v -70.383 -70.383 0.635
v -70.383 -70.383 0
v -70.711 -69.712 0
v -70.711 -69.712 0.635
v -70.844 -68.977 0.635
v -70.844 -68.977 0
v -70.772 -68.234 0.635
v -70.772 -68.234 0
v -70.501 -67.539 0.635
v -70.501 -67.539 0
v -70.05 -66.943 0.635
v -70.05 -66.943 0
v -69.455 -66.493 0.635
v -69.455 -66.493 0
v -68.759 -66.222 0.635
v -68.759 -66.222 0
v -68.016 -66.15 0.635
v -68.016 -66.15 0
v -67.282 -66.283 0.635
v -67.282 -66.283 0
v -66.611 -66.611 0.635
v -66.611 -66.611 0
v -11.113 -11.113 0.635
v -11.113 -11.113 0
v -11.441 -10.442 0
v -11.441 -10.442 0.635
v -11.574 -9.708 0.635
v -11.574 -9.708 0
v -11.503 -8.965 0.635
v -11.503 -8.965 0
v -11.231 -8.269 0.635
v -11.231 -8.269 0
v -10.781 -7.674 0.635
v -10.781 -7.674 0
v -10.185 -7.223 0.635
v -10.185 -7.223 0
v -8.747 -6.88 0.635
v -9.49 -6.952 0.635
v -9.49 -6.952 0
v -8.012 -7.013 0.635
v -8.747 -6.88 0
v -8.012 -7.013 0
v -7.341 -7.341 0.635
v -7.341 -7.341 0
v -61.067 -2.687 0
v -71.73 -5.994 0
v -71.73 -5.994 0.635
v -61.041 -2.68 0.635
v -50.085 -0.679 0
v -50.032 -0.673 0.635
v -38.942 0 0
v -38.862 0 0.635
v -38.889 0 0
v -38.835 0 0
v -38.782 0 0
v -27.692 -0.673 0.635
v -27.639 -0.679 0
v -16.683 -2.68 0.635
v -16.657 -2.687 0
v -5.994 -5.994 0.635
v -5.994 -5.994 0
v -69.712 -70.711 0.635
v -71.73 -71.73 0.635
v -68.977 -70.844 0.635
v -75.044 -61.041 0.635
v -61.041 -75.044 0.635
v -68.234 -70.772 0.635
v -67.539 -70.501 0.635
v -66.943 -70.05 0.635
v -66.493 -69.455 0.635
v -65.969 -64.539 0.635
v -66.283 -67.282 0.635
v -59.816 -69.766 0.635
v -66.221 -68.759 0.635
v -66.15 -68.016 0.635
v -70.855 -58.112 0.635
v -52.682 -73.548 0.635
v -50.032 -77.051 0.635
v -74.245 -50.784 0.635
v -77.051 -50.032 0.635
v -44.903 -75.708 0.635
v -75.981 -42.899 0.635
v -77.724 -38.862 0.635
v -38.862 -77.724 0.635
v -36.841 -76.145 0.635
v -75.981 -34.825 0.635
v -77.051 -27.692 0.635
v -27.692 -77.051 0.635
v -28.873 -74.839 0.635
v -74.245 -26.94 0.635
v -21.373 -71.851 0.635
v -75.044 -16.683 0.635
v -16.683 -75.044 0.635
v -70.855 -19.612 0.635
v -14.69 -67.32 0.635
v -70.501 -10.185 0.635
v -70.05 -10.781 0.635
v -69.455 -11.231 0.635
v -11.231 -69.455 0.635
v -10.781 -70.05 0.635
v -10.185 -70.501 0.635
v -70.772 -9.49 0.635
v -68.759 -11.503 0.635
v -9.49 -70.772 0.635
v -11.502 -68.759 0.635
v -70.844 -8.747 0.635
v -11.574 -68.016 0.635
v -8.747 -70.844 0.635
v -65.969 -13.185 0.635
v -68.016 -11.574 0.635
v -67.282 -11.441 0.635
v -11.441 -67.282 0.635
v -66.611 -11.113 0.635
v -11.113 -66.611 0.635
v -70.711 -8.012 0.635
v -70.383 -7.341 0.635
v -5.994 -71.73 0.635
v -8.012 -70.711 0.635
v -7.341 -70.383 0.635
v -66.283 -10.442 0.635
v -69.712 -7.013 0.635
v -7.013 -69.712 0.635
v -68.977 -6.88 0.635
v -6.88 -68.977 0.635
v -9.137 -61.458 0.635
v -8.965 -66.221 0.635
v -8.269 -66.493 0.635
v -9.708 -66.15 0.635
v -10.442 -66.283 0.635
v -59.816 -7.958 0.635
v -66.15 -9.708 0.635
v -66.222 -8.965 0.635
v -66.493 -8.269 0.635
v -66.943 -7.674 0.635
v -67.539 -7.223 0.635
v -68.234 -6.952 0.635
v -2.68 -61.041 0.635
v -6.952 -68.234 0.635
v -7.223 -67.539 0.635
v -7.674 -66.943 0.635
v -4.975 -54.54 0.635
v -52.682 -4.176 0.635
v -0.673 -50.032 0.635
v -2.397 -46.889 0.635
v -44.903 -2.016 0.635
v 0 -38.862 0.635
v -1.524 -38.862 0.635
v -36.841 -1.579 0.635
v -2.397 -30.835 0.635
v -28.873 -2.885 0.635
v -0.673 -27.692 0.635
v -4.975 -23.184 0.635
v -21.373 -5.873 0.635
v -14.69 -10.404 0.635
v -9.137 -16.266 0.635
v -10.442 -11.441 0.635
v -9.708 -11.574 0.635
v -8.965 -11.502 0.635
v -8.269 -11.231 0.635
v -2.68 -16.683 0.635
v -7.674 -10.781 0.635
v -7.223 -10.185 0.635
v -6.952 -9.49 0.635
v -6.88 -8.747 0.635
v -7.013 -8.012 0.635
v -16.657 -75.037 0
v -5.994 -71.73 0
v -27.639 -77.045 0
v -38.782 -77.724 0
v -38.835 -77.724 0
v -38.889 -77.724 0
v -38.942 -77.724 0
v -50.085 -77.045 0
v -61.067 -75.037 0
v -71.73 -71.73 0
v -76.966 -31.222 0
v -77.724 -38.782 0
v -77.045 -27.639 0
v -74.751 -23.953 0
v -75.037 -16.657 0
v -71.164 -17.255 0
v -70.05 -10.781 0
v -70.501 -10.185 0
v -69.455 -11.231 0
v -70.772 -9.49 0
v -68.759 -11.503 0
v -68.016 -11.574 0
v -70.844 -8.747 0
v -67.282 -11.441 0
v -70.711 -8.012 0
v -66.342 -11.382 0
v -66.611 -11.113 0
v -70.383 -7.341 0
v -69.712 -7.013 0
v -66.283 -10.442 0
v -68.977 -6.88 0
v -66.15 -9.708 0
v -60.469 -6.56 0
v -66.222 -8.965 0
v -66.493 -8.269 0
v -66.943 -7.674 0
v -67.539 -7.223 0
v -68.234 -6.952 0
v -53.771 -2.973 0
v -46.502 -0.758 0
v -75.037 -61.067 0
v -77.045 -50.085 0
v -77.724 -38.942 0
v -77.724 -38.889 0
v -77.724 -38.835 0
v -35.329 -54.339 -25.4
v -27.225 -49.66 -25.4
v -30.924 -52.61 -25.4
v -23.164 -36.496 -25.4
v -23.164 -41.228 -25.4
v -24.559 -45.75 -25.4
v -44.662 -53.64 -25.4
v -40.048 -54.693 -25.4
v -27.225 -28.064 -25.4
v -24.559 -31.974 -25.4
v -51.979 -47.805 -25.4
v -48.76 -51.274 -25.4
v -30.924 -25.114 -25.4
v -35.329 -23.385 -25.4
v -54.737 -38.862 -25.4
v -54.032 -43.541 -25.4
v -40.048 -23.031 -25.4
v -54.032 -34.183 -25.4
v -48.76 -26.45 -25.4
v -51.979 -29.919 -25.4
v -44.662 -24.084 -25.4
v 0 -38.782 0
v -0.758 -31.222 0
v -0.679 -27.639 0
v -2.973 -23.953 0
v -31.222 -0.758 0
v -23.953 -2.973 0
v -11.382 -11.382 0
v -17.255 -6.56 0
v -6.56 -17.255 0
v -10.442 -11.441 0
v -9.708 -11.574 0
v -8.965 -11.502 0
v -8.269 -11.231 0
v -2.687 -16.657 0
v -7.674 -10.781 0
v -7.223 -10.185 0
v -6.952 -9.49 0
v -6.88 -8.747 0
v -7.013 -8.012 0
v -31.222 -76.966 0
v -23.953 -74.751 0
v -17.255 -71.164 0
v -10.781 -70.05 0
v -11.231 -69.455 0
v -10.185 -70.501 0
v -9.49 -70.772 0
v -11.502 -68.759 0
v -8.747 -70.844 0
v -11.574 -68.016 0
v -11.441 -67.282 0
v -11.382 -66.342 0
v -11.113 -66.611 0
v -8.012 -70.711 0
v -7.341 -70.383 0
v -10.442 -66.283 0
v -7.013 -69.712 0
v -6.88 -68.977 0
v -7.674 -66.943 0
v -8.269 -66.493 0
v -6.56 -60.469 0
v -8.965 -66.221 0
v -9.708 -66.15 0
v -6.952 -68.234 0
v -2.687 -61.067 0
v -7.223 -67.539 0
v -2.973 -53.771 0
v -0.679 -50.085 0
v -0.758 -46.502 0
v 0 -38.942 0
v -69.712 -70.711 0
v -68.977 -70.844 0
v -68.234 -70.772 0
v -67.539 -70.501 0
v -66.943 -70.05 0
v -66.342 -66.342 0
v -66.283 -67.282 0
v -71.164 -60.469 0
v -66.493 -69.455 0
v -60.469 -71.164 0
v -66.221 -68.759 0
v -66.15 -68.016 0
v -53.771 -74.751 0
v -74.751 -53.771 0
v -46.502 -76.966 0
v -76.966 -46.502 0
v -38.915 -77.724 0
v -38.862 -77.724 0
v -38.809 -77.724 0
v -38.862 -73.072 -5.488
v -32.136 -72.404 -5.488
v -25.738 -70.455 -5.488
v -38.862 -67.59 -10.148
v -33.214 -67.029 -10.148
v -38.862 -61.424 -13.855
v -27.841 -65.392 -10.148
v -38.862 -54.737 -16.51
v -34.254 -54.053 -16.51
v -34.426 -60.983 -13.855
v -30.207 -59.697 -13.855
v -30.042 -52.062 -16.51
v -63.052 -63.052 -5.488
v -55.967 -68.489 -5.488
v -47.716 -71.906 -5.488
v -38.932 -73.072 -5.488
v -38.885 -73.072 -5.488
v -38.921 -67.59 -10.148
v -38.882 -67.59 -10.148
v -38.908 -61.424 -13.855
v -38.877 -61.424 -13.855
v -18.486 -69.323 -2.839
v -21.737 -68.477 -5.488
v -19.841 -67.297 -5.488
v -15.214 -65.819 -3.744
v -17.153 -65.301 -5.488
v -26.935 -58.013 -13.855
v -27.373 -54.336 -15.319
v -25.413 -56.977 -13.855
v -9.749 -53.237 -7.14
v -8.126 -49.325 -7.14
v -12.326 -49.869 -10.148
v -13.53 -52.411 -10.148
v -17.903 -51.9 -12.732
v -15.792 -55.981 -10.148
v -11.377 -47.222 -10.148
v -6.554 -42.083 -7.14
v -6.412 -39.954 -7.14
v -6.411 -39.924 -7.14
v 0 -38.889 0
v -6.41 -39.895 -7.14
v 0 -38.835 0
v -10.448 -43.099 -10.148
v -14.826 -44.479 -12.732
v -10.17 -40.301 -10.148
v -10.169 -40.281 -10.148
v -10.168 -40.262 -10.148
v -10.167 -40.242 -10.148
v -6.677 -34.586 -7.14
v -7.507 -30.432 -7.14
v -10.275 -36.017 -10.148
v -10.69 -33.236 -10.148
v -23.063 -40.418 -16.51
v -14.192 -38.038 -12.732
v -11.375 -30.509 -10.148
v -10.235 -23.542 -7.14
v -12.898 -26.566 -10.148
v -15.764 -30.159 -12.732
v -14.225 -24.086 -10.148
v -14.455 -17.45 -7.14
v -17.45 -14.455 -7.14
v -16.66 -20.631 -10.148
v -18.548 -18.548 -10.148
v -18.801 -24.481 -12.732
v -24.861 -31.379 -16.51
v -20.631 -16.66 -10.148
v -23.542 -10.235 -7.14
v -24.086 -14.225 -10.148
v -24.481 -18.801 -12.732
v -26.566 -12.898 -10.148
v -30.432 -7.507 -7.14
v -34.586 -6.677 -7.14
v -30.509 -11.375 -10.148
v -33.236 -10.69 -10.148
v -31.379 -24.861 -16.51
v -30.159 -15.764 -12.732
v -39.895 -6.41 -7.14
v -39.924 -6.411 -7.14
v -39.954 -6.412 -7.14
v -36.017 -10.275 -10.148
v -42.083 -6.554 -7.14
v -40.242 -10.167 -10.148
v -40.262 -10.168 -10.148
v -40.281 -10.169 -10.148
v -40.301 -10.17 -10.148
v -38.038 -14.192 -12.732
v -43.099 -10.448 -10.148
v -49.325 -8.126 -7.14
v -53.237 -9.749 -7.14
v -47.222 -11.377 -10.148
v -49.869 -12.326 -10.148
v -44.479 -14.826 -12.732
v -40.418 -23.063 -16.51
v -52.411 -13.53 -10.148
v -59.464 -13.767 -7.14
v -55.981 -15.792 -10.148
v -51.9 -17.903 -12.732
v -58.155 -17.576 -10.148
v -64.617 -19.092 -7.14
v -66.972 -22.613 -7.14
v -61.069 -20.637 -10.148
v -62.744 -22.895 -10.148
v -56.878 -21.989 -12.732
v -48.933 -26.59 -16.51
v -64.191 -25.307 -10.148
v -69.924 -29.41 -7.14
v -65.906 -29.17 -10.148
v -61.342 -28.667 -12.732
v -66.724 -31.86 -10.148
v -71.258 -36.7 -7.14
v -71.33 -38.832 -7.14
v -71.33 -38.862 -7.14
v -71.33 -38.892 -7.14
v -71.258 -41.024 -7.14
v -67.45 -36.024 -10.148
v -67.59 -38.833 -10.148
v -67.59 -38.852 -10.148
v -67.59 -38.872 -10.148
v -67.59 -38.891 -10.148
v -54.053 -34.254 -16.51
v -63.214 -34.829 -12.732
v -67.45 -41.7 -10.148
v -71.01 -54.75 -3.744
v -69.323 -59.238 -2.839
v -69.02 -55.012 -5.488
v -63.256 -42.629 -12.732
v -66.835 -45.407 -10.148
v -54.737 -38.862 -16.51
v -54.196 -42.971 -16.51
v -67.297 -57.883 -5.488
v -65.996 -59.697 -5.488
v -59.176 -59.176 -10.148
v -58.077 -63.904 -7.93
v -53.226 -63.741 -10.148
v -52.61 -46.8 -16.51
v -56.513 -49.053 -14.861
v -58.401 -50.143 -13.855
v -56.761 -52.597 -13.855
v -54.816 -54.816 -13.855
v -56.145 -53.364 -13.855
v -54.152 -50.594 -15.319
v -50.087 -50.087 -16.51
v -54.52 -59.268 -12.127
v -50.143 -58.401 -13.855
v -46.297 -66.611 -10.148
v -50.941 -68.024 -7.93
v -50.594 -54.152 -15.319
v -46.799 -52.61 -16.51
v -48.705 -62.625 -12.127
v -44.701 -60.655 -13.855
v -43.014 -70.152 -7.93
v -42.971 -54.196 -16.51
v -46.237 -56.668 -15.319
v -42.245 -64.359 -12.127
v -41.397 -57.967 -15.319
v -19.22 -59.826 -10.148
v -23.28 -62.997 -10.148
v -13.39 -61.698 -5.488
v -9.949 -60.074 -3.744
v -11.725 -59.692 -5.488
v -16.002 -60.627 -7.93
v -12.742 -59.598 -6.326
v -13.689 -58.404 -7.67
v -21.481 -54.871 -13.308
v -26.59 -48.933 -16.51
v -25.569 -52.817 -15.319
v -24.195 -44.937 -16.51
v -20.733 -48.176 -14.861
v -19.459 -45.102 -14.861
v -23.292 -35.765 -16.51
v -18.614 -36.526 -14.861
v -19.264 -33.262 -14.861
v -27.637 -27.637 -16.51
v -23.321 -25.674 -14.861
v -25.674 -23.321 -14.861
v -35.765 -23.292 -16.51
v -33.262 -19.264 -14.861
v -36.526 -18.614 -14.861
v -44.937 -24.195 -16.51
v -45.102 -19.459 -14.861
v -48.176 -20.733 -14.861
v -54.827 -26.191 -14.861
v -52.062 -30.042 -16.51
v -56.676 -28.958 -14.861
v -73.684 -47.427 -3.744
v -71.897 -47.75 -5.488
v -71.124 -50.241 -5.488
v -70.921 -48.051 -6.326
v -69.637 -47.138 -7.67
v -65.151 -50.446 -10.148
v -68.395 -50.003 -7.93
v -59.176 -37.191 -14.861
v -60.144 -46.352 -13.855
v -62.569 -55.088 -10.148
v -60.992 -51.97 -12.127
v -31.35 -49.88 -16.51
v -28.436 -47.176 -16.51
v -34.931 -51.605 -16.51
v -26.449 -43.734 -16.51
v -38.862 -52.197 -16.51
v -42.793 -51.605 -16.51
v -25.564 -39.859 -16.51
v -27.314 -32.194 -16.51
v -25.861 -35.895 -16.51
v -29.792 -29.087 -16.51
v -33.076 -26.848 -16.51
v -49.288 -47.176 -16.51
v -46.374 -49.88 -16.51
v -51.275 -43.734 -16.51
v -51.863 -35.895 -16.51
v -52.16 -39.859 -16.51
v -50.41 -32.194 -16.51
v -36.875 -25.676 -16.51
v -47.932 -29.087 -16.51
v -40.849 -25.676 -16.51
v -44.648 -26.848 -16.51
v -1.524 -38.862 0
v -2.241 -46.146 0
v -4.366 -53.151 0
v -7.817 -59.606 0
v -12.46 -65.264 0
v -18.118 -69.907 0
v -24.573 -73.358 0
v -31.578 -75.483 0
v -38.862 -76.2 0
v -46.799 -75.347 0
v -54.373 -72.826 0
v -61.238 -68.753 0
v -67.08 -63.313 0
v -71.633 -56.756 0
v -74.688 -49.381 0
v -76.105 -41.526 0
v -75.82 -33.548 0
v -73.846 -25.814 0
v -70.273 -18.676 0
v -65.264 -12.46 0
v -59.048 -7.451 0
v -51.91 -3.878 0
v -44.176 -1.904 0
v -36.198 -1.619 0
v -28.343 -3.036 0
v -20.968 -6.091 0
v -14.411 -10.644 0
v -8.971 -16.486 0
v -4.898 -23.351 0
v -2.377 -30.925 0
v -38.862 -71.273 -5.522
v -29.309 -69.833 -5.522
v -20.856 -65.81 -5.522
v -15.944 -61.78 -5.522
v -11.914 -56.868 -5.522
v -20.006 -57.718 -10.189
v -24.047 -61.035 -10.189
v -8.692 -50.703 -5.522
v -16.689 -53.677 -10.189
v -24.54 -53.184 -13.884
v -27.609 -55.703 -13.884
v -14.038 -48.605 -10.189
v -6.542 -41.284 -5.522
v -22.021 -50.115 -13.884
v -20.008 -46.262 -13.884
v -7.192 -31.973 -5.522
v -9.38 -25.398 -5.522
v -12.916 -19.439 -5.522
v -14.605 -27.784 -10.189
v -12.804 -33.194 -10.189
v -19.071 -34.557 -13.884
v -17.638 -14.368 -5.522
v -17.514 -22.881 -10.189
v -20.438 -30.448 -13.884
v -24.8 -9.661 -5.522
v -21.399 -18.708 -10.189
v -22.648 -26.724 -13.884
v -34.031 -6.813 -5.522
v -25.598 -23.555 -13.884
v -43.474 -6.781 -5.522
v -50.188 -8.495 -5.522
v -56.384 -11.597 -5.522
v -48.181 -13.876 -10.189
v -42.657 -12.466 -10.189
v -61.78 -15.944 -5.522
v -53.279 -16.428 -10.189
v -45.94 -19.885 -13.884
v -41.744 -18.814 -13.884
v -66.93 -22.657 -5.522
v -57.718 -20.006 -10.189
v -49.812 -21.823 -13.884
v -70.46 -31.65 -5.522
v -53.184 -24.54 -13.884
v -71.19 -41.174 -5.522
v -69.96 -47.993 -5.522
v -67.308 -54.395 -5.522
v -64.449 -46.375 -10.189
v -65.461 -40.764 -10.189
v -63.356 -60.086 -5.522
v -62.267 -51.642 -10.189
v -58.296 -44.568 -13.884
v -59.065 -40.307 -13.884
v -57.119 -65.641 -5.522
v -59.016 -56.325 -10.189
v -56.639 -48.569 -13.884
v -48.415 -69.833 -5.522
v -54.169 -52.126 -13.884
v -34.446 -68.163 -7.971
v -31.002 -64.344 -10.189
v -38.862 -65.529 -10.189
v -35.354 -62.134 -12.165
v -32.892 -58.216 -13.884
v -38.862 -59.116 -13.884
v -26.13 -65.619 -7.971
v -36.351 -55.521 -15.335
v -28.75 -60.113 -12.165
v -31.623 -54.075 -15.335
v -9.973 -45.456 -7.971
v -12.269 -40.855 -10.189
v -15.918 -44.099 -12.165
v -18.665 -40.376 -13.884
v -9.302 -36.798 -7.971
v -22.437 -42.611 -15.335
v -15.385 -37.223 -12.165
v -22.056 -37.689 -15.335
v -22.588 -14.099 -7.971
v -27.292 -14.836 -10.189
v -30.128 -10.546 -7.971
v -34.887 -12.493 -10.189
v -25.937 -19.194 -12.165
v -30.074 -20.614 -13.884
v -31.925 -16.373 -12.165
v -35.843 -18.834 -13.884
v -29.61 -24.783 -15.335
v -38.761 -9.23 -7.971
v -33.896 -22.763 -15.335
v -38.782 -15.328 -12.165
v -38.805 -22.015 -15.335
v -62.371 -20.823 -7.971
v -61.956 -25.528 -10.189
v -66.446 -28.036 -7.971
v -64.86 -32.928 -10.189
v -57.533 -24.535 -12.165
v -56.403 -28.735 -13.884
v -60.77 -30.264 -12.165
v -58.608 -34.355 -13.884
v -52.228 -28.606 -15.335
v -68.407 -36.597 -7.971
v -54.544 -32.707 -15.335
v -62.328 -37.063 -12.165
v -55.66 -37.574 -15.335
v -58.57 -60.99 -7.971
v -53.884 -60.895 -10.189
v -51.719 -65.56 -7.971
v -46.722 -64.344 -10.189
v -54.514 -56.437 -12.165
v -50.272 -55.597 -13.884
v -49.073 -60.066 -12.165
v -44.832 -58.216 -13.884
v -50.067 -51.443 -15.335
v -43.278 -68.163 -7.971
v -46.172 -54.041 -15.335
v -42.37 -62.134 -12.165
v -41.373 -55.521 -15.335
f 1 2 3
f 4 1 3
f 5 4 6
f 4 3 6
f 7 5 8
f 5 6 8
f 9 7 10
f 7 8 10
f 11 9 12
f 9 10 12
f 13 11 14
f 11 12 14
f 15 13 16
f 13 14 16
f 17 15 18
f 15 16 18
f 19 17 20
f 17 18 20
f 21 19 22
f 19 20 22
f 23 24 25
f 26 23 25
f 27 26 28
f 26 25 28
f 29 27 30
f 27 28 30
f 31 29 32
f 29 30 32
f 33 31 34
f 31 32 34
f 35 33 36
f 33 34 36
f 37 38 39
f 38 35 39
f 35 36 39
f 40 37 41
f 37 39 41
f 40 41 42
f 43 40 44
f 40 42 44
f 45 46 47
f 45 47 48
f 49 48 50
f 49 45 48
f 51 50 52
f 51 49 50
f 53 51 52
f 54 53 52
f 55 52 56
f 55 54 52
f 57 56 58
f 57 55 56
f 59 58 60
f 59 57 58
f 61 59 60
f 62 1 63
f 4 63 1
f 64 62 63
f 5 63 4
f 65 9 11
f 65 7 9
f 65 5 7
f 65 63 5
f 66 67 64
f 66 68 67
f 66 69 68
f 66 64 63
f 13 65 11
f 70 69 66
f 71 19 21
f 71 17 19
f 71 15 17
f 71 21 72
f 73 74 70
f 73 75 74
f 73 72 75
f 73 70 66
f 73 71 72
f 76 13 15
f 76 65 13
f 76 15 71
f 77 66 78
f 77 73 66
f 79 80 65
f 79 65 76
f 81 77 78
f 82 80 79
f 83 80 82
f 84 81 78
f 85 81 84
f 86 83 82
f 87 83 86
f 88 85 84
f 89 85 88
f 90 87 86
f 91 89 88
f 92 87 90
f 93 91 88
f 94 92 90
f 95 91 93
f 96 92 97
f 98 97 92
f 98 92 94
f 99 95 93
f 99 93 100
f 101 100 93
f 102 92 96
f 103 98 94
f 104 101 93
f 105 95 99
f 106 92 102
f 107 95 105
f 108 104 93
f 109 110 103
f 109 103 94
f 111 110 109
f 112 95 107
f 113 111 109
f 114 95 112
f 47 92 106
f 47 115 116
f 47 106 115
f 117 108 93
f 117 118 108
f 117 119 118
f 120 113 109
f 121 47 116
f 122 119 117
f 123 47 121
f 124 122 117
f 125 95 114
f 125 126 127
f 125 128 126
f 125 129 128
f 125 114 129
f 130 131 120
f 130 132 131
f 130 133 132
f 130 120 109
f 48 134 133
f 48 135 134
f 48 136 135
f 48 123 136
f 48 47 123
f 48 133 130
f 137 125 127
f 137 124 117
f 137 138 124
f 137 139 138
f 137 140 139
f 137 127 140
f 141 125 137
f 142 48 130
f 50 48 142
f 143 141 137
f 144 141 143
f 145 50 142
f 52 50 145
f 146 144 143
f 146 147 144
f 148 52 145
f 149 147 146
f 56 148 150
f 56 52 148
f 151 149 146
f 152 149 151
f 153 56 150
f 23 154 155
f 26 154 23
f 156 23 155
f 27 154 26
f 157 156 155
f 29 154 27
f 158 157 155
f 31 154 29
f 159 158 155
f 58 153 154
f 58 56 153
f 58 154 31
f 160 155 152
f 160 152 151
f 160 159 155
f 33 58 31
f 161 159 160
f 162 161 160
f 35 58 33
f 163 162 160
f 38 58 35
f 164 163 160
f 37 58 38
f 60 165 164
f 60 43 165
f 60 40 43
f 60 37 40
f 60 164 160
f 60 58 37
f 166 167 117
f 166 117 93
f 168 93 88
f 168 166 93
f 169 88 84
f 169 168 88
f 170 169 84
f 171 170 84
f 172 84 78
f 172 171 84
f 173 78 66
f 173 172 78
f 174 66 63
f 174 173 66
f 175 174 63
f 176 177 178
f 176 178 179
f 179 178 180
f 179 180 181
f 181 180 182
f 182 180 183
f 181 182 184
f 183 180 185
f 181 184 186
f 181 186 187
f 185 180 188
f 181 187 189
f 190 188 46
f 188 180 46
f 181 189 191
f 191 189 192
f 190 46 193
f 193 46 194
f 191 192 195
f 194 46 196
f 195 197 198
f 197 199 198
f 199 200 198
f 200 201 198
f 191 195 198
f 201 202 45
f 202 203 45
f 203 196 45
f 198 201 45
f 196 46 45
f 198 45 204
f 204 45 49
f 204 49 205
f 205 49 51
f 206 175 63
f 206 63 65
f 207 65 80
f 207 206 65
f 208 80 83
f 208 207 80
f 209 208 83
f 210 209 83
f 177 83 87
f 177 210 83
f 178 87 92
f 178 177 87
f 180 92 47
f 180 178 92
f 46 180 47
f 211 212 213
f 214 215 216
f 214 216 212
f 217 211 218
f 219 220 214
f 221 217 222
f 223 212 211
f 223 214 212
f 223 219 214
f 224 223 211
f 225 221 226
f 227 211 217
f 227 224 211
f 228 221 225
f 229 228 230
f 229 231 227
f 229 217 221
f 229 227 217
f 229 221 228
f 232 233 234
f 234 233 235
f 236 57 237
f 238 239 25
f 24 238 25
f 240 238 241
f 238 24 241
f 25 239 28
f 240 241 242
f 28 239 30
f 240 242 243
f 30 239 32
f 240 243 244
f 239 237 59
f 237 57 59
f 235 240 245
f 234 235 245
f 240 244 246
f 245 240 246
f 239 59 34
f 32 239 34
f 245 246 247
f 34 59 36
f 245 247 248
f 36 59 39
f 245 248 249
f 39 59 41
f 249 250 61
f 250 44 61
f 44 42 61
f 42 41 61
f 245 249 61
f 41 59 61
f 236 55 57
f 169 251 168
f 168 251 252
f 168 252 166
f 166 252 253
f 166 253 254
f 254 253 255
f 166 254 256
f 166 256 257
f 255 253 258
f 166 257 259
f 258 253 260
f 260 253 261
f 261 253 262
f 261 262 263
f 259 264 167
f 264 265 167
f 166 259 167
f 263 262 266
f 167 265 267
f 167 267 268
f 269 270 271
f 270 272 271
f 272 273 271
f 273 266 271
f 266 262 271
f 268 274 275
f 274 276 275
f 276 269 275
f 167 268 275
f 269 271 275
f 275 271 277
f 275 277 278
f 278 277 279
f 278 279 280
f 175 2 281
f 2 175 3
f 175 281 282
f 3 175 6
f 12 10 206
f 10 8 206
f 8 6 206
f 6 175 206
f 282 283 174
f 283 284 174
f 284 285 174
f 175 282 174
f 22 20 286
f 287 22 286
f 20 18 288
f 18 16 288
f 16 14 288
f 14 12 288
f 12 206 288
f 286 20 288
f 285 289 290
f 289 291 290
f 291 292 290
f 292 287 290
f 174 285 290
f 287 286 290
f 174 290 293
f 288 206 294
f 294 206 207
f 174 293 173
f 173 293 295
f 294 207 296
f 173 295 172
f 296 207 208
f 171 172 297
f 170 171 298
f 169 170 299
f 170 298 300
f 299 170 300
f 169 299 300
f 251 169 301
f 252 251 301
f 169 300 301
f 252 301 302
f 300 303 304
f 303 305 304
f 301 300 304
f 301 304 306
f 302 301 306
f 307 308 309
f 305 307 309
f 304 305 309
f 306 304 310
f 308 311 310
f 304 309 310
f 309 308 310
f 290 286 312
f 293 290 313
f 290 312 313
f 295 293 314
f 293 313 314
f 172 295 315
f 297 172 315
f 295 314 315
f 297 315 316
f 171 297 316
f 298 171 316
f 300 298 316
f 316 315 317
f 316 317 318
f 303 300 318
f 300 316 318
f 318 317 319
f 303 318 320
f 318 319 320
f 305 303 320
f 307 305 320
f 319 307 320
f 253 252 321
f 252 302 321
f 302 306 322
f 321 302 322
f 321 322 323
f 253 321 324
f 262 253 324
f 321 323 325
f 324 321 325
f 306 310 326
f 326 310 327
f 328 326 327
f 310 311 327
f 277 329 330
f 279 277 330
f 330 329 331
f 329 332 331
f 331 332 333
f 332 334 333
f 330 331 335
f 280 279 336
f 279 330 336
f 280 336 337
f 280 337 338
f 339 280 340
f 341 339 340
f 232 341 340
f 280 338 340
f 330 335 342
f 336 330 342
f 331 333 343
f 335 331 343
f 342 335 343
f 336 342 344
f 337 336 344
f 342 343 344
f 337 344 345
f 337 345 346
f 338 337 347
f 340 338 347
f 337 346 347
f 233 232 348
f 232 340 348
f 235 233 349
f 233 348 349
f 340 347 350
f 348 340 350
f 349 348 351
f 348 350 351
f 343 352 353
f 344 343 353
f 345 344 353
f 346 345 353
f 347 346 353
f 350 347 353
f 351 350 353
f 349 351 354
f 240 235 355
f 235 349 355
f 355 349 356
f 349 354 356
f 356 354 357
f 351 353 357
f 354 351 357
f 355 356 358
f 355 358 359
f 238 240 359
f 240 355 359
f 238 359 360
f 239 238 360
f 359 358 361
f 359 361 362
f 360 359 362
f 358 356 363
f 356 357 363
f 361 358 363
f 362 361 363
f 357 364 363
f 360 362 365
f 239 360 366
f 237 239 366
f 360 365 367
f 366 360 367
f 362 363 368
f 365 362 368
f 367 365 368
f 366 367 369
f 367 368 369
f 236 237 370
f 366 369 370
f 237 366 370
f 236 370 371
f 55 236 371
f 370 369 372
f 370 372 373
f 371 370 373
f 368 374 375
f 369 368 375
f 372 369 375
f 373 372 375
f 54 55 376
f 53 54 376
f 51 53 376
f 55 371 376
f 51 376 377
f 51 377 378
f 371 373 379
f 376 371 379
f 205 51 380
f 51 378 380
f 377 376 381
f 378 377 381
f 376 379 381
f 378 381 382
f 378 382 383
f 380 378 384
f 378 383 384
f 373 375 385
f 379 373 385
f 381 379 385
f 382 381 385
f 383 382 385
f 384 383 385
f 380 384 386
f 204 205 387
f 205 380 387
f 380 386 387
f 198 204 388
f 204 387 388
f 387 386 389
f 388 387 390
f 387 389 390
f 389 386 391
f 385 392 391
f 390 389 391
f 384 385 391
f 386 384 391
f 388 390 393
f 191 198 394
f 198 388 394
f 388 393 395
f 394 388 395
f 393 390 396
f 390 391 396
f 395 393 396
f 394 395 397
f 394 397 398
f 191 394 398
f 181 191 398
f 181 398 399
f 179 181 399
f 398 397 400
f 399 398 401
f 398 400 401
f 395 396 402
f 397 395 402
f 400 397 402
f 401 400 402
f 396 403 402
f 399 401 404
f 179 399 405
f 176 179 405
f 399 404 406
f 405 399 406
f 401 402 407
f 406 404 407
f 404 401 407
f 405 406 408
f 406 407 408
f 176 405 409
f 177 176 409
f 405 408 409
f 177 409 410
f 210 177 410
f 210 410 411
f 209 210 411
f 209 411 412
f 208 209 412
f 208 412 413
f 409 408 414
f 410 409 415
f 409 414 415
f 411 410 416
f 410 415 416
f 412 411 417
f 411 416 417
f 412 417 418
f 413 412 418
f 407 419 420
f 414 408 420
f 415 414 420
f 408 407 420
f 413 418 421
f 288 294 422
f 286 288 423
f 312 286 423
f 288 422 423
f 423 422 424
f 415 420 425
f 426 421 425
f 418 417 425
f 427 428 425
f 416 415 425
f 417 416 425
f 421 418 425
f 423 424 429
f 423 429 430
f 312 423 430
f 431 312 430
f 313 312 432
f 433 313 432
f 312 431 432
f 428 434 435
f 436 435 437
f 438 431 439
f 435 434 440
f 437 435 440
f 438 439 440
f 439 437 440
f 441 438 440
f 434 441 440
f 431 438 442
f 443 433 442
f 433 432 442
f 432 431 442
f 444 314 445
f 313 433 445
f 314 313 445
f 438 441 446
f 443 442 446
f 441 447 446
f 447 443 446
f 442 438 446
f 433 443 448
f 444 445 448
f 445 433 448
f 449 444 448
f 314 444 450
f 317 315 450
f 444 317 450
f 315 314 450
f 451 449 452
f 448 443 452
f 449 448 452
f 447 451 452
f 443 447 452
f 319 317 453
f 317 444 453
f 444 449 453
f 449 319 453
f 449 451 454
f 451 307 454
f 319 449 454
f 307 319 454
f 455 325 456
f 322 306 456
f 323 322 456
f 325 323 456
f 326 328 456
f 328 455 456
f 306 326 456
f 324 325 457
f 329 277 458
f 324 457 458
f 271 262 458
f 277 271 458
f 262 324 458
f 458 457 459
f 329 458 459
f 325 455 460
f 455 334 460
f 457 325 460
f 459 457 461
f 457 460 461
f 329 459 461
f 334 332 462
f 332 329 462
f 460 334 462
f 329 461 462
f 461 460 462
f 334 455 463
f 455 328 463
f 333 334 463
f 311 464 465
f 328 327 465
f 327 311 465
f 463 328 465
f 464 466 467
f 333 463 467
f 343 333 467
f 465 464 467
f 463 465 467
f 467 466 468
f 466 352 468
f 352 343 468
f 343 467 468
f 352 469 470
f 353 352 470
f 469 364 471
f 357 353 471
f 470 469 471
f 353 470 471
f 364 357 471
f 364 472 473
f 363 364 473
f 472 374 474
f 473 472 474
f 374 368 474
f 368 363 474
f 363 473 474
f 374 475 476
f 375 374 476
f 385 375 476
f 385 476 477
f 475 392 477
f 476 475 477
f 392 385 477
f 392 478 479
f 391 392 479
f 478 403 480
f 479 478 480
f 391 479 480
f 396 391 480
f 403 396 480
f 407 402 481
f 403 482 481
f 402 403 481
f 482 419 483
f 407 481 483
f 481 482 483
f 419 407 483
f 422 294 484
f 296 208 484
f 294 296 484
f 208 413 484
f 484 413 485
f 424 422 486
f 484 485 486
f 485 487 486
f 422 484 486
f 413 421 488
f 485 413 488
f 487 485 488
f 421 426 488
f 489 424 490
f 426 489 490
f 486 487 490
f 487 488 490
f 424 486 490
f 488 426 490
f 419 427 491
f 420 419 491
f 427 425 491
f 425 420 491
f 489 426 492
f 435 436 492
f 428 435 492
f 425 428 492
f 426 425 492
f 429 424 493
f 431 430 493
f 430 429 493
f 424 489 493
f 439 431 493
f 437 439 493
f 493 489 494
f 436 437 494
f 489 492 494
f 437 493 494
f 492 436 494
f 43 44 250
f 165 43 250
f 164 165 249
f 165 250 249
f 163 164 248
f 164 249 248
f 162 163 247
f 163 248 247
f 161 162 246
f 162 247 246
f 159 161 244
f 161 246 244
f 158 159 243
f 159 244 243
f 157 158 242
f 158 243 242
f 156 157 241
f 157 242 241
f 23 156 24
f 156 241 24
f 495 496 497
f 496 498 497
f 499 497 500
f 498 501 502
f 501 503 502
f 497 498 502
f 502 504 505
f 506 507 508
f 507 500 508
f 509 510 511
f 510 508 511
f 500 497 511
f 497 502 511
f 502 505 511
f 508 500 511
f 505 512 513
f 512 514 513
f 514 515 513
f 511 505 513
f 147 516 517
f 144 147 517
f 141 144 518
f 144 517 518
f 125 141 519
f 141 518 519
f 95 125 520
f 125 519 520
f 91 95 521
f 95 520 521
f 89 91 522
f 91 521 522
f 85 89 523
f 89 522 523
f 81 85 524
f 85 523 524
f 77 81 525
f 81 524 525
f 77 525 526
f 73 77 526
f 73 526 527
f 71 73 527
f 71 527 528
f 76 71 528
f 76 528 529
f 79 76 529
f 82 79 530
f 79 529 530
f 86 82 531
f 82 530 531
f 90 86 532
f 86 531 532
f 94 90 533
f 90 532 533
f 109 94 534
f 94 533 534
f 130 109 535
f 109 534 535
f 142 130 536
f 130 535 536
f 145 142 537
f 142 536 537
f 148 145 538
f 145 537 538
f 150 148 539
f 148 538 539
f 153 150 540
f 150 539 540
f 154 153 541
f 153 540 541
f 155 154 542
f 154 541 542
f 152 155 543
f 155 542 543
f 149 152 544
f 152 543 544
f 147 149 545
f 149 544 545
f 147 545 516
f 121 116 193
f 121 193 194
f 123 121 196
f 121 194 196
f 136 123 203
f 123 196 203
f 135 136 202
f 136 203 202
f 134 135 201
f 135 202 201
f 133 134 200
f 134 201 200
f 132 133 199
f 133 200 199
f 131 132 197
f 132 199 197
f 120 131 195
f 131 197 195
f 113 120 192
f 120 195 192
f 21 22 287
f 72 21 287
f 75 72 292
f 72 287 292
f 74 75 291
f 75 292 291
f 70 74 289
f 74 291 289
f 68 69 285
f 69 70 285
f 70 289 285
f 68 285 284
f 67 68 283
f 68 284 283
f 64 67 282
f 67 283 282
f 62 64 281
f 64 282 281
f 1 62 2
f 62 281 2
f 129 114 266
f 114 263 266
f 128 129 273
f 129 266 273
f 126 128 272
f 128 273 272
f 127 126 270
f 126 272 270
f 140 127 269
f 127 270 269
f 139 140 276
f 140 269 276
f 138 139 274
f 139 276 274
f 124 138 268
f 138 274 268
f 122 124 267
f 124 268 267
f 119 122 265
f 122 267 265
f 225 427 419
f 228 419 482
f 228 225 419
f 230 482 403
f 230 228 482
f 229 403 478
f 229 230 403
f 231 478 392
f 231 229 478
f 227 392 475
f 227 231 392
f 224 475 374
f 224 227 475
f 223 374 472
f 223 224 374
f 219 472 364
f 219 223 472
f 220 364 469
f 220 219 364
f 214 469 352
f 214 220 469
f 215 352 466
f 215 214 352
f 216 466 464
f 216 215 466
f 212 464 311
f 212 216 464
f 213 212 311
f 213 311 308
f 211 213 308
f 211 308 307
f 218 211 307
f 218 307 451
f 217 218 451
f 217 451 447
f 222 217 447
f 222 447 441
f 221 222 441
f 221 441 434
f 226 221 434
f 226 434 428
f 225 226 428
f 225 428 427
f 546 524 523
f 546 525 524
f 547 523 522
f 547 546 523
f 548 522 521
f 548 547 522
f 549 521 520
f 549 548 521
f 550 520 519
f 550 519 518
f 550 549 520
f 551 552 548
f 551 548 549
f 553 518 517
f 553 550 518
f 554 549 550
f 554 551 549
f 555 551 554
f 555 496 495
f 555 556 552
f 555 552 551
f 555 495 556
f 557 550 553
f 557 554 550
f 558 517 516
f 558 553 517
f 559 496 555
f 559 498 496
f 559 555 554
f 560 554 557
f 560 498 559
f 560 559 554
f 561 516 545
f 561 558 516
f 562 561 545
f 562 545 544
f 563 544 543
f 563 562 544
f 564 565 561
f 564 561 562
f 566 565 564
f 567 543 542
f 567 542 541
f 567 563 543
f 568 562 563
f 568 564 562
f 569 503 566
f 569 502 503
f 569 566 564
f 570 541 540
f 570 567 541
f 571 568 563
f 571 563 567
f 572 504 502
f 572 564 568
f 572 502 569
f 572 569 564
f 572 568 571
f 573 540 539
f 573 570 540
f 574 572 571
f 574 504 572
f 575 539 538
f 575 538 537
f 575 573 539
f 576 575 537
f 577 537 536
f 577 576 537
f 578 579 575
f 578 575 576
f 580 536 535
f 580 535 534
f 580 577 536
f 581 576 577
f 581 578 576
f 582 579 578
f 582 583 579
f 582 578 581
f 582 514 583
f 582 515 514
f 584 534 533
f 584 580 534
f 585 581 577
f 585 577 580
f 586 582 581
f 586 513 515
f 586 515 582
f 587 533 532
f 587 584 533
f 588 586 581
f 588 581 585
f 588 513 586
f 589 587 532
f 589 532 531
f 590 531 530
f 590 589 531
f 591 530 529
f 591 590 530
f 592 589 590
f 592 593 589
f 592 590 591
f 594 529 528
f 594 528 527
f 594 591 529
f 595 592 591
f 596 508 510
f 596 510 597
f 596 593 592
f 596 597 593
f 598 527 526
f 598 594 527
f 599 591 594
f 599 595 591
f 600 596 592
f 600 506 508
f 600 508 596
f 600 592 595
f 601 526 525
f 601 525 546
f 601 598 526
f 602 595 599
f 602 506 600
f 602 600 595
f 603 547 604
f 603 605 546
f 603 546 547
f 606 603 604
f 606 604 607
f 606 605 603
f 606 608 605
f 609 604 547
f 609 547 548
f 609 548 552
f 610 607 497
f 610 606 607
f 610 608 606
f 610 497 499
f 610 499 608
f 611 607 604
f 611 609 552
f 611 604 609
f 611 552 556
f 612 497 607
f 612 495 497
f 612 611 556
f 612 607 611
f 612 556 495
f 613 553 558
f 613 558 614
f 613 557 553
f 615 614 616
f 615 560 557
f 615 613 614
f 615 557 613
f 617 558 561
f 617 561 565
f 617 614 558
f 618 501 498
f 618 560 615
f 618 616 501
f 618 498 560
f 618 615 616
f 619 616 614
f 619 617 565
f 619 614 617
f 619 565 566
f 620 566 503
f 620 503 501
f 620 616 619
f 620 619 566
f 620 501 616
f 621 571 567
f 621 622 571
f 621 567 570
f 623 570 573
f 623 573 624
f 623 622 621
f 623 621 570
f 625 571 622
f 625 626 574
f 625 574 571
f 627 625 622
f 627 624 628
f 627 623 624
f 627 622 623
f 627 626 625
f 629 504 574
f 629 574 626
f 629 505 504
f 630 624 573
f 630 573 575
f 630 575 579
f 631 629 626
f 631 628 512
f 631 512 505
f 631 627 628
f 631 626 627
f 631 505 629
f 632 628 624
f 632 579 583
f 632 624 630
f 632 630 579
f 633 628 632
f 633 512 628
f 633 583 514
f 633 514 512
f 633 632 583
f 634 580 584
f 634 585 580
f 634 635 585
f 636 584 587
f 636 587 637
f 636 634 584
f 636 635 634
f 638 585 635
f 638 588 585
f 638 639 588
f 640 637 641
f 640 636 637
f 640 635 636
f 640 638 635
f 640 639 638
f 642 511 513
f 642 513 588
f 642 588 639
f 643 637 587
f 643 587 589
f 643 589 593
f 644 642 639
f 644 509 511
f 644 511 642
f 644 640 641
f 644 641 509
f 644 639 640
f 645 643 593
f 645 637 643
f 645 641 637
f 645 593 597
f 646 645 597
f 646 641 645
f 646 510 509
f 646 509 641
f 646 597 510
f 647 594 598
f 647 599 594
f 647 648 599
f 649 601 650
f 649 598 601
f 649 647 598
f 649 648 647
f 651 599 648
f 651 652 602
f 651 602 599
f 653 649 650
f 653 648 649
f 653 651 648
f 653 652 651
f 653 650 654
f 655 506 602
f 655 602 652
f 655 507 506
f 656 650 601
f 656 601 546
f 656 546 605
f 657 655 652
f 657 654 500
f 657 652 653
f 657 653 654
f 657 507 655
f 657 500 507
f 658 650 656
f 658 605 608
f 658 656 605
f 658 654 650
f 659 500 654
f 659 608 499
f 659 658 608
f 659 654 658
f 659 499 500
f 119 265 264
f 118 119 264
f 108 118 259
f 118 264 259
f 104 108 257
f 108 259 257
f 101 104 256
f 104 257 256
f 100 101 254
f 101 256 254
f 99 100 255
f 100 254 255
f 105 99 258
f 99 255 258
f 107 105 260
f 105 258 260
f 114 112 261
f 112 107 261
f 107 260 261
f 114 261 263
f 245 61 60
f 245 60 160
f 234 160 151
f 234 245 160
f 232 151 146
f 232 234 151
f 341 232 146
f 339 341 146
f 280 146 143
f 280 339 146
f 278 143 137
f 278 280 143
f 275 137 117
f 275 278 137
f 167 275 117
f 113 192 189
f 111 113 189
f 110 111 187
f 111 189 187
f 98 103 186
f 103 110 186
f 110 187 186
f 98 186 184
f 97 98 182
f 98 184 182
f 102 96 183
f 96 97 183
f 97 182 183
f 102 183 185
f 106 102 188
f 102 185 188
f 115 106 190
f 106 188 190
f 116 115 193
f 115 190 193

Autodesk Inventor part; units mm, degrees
ref_plane "XZ Plane" through (0, 0, 0) normal (0, 1, 0) x (-1, 0, 0)
sketch "Sketch1" plane through (0, 0, 0) normal (0, 0, 1) x (1, 0, 0)
  circle A0 centre (-38.862, -38.862) radius 37.338
  arc A1 (-5.9943, -5.9943) -> (-71.7297, -5.9943) centre (-38.862, -93.1073) ccw
  arc A2 (-5.9943, -71.7297) -> (-5.9943, -5.9943) centre (-93.1073, -38.862) ccw
  arc A3 (-71.7297, -71.7297) -> (-5.9943, -71.7297) centre (-38.862, 15.3833) ccw
  arc A4 (-71.7297, -5.9943) -> (-71.7297, -71.7297) centre (15.3833, -38.862) ccw
  arc A5 (-7.3413, -7.3413) -> (-11.113, -11.113) centre (-8.8594, -9.595) ccw
  arc A6 (-11.113, -11.113) -> (-7.3413, -7.3413) centre (-9.595, -8.8594) ccw
  arc A7 (-66.611, -11.113) -> (-70.3827, -7.3413) centre (-68.8646, -9.595) ccw
  arc A8 (-70.3827, -7.3413) -> (-66.611, -11.113) centre (-68.129, -8.8594) ccw
  arc A9 (-11.113, -66.611) -> (-7.3413, -70.3827) centre (-8.8594, -68.129) ccw
  arc A10 (-7.3413, -70.3827) -> (-11.113, -66.611) centre (-9.595, -68.8646) ccw
  arc A11 (-70.3827, -70.3827) -> (-66.611, -66.611) centre (-68.8646, -68.129) ccw
  arc A12 (-66.611, -66.611) -> (-70.3827, -70.3827) centre (-68.129, -68.8646) ccw
  point P0 (0, 0)
extrude "Extrusion1" add sketch "Sketch1" along normal blind 0.635
ref_plane "Work Plane1" through (0, 0, -25.4) normal (0, 0, -1) x (-1, 0, 0)
sketch "Sketch2" plane through (0, 0, -25.4) normal (0, 0, -1) x (-1, 0, 0)
  circle A0 centre (38.862, -38.862) radius 37.338 projected
  circle A1 centre (38.862, -38.862) radius 15.875
  point P0 (0, 0)
  dimension "d19" = 31.75
extrude "Extrusion2" add sketch "Sketch2" against normal blind 8.89 contours A1
ref_plane "Work Plane2" through (-38.862, 0, 0) normal (1, 0, 0) x (0, 1, 0)
sketch "Sketch6" plane through (-38.862, 0, 0) normal (1, 0, 0) x (0, 1, 0)
  line L0 (-22.987, -16.51) -> (-54.737, -16.51) projected
  arc A0 (-22.987, -16.51) -> (0, 0) centre (-35.8743, 25.6906) ccw
  arc A1 (-77.724, 0) -> (-54.737, -16.51) centre (-41.8497, 25.6906) ccw
  line L1 (-54.737, -16.51) -> (-52.197, -16.51)
  line L2 (-22.987, -16.51) -> (-25.527, -16.51)
  line L3 (-1.524, 0) -> (-76.2, 0) projected
  arc A2 (-76.2, 0) -> (-52.197, -16.51) centre (-39.2568, 28.0064) ccw
  line L4 (-77.724, 0) -> (-76.2, 0)
  line L5 (-71.7297, 0) -> (-77.724, 0) projected
  line L6 (-38.862, -16.51) -> (-38.862, 9.6565)
  dimension "d23" = 2.54
  dimension "d24" = 2.54
revolve "Revolution1" add sketch "Sketch6" angle 360 about axis through (-38.862, -38.862, -16.51) along (0, 0, 1) contours L0 A1 L4 A2
properties part number "Nathan_Speaker"
